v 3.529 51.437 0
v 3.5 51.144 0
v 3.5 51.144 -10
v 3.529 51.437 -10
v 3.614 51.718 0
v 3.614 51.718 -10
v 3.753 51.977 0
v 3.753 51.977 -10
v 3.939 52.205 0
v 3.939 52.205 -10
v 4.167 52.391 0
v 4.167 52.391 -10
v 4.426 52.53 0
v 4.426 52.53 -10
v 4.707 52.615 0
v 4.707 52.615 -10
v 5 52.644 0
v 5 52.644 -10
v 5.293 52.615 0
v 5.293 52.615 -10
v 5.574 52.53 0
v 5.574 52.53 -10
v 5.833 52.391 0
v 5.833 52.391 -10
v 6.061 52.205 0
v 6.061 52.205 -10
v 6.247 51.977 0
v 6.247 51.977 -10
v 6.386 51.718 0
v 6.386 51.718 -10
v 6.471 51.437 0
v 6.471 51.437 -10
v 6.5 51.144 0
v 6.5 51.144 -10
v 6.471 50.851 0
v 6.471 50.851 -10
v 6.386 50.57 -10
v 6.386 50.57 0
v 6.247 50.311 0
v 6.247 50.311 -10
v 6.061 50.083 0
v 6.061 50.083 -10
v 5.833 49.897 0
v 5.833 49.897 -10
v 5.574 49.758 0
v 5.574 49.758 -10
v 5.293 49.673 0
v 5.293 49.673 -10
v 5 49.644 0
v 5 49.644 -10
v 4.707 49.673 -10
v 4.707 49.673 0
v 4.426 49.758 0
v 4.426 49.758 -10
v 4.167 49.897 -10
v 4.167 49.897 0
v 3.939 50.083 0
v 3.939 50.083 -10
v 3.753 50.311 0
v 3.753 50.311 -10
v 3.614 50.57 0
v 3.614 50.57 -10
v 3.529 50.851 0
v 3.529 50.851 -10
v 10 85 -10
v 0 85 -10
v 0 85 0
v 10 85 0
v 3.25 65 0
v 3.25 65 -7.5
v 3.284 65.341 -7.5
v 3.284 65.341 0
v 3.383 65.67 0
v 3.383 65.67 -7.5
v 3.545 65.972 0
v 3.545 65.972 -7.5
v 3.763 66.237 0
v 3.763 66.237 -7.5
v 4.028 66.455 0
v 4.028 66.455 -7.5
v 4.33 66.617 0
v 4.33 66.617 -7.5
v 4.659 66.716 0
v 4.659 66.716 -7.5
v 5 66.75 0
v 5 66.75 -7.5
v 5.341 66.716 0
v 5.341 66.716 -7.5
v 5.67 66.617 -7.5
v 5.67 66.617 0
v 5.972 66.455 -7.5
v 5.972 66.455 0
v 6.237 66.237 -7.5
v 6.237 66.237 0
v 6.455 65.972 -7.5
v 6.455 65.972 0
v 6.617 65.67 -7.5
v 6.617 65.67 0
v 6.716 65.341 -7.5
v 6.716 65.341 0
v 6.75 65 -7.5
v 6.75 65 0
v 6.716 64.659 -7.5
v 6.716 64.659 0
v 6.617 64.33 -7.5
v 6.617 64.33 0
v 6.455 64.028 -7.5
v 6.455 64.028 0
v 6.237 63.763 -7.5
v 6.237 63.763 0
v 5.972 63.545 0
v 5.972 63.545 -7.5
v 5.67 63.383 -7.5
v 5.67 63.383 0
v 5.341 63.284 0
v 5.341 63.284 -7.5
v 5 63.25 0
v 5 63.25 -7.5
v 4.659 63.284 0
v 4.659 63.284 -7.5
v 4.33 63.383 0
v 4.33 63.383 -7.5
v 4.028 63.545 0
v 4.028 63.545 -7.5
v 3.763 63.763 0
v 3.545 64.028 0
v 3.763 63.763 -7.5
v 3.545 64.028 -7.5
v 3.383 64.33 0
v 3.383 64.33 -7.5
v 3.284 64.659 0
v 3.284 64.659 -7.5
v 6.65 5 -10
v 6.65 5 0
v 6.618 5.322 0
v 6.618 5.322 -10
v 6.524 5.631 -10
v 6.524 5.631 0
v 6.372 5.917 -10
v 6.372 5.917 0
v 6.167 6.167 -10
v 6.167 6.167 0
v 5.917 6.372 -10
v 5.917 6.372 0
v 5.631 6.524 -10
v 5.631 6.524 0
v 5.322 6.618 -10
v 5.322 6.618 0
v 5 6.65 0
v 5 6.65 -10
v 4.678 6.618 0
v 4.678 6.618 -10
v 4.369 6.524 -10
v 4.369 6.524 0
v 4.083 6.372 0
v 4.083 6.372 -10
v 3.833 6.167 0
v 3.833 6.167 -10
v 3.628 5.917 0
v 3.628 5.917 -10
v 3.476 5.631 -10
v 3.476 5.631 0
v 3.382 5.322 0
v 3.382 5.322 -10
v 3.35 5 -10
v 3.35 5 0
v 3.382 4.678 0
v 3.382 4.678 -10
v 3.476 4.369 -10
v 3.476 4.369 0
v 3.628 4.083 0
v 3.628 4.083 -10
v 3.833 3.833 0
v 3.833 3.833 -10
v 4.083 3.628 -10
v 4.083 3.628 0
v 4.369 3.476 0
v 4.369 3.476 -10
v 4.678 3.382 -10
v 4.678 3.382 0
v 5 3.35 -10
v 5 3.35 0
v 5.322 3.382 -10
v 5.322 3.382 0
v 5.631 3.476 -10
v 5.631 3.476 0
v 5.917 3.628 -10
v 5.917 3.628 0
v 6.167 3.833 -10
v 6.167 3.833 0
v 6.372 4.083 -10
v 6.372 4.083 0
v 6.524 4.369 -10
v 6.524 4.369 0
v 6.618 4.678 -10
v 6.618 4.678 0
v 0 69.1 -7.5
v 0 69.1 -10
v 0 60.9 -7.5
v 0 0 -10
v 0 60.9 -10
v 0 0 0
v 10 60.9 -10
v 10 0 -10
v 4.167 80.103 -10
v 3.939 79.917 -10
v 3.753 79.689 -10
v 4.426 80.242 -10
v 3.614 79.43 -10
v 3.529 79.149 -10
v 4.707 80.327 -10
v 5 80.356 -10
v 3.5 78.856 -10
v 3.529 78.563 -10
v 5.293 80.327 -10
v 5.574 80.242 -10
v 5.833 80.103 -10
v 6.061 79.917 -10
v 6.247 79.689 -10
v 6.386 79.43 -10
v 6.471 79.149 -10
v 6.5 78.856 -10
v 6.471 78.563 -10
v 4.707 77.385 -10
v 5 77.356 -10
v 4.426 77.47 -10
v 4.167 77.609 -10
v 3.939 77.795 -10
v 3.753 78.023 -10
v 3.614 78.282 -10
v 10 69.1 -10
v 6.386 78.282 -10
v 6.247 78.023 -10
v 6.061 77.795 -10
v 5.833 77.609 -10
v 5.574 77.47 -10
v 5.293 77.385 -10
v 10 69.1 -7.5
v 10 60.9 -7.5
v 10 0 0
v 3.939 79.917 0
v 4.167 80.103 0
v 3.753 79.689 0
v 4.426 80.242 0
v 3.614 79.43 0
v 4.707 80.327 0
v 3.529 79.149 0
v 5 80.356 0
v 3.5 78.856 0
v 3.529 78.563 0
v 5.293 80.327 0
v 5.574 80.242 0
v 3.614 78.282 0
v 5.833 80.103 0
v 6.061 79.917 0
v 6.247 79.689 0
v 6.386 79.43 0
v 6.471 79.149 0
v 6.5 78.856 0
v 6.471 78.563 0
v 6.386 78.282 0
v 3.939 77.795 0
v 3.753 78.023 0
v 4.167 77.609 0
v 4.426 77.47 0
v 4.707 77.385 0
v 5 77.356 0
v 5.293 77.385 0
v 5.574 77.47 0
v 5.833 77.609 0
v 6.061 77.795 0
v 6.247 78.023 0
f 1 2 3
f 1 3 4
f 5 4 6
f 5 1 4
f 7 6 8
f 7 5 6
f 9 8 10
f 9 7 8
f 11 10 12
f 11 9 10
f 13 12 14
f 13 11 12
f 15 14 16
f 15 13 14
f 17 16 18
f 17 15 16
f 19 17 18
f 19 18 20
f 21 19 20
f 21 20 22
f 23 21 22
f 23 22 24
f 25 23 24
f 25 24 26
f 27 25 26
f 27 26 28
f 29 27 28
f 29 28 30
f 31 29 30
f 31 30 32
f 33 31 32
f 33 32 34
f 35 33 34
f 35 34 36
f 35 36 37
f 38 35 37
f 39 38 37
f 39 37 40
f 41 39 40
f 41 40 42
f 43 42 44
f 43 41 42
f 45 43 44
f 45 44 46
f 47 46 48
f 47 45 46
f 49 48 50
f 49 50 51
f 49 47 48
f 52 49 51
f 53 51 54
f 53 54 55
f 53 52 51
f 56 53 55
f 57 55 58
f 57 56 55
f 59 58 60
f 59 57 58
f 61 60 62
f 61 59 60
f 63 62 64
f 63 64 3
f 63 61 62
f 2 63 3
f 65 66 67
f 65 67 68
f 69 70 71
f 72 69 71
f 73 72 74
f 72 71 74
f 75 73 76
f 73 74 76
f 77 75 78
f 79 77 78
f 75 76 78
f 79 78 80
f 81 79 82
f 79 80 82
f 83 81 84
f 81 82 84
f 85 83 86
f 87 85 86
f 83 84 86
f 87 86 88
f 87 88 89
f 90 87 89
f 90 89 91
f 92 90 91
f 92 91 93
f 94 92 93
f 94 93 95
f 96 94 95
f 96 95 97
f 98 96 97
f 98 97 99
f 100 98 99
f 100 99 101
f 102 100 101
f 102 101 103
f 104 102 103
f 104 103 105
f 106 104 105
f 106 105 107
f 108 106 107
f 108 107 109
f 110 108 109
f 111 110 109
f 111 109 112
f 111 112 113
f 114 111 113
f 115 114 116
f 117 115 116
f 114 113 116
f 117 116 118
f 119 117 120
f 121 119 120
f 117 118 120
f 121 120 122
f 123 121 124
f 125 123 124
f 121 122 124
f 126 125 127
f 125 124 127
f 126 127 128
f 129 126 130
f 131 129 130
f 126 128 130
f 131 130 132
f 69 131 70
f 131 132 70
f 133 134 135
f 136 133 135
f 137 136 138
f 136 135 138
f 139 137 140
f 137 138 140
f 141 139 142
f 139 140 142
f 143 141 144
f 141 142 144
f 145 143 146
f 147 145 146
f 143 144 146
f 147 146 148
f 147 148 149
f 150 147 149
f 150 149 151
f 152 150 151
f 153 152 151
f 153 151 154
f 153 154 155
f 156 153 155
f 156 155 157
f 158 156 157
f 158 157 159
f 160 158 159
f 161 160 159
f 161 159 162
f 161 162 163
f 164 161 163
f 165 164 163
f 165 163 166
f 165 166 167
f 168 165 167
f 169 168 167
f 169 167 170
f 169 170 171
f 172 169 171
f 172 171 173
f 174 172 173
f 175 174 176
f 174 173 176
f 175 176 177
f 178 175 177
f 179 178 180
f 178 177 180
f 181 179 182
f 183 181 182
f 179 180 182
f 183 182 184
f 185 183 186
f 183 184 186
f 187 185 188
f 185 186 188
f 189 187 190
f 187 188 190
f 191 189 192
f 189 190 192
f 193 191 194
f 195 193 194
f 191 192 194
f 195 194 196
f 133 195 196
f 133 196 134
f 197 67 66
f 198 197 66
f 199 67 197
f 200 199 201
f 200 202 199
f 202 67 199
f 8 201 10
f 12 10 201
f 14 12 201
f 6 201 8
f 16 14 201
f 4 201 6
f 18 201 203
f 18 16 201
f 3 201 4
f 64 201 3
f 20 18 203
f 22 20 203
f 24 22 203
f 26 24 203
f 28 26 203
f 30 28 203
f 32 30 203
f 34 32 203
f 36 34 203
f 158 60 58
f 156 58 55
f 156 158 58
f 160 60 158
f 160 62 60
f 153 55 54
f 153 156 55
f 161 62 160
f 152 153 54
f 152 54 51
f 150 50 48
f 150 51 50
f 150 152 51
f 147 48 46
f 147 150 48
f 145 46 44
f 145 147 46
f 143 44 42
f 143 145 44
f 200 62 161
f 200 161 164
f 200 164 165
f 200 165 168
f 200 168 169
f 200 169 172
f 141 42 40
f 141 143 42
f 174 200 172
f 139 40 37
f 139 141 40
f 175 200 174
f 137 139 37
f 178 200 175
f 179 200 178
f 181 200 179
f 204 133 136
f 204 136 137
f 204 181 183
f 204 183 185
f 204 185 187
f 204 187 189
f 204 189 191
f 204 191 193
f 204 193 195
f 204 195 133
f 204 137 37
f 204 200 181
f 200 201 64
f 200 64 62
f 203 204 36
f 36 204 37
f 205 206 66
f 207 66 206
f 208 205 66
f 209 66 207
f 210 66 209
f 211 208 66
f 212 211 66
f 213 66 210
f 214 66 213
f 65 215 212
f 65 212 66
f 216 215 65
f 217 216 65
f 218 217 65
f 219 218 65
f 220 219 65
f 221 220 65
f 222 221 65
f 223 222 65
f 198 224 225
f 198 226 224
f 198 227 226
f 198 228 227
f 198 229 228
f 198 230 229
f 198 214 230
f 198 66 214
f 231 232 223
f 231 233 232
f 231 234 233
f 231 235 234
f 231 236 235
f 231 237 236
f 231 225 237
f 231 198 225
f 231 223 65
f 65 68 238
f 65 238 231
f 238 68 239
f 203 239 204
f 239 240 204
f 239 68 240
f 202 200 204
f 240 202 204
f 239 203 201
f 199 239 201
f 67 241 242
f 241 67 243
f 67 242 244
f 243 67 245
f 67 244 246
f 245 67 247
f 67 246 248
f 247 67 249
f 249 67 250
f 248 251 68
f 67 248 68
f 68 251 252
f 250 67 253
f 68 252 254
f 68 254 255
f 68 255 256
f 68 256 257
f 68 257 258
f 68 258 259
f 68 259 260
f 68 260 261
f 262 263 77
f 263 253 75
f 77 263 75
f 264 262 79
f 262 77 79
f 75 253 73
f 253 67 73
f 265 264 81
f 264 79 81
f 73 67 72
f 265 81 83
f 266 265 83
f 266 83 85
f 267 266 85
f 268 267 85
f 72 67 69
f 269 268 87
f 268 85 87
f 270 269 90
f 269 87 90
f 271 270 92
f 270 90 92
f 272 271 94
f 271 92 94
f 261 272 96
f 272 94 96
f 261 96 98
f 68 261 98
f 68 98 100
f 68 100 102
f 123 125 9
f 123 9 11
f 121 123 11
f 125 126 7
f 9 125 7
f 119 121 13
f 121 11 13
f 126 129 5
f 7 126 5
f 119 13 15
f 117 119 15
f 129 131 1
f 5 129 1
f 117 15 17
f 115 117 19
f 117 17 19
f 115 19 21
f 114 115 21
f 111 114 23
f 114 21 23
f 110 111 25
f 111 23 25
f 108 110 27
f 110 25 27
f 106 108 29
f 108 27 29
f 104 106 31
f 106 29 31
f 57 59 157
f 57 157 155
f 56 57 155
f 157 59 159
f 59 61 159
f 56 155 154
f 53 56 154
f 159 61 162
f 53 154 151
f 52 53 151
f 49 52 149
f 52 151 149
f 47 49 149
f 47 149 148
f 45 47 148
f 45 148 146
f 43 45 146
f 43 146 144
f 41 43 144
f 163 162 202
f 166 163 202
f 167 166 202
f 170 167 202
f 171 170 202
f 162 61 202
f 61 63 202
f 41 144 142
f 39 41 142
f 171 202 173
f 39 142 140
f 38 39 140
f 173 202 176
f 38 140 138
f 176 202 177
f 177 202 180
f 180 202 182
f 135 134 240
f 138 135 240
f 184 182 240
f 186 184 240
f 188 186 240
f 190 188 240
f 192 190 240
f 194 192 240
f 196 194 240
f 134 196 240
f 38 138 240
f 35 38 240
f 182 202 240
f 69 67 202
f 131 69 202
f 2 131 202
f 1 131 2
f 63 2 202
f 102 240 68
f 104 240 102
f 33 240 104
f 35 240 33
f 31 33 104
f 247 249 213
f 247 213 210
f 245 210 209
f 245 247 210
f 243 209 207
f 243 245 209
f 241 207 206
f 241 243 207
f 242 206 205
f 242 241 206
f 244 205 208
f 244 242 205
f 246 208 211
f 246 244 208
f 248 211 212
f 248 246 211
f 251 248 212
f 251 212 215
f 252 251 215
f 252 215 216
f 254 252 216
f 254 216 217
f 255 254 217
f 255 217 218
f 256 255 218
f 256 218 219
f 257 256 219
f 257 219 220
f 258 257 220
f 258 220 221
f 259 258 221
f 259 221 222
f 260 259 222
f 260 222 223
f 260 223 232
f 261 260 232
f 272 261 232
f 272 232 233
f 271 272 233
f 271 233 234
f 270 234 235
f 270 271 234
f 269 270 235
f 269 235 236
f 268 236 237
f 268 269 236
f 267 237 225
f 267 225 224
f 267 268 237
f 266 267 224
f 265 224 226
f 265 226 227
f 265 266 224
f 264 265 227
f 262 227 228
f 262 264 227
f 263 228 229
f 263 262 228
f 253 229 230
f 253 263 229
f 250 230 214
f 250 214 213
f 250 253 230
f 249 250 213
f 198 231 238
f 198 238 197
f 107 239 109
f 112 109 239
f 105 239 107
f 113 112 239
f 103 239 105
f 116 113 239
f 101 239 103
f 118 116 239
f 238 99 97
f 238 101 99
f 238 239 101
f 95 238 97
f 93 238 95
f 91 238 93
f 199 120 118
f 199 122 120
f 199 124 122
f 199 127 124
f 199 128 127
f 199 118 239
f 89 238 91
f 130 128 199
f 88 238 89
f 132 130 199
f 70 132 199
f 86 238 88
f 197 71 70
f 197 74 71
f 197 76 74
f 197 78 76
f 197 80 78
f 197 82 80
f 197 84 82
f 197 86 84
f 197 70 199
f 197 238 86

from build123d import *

# Parameters (mm, degrees)
SKETCH1_W               = 10
SKETCH1_H               = 10
BOSS_EXTRUDE1_DEPTH     = 85
CUT_EXTRUDE1_DEPTH      = 2.5
SKETCH3_R               = 1.75
CUT_EXTRUDE2_DEPTH      = 86.914201387
CUT_EXTRUDE3_DEPTH      = 2.5
CUT_EXTRUDE3_DEPTH_BACK = 86.914201387
SKETCH4_R               = 1.5
SKETCH5_R               = 1.65
CUT_EXTRUDE4_DEPTH      = 87.168439698


with BuildPart() as part:
    # Sketch1 → Boss-Extrude1 (new body)
    with BuildSketch(Plane(origin=(0, 0, 0), x_dir=(1, 0, 0), z_dir=(0, 1, 0))):
        with Locations((5, 5)):
            Rectangle(SKETCH1_W, SKETCH1_H)
    extrude(amount=BOSS_EXTRUDE1_DEPTH)

    # Sketch2 → Cut-Extrude1 (cut)
    with BuildSketch(Plane(origin=(0, 0, -10), x_dir=(-1, 0, 0), z_dir=(0, 0, -1))):
        Polygon((0, 60.9), (0, 69.1), (-5, 69.1), (-10, 69.1), (-10, 60.9), align=None)
    extrude(amount=-CUT_EXTRUDE1_DEPTH, mode=Mode.SUBTRACT)

    # Sketch3 → Cut-Extrude2 (cut, through all)
    with BuildSketch(Plane(origin=(0, 0, -7.5), x_dir=(-1, 0, 0), z_dir=(0, 0, -1))):
        with Locations((-5, 65)):
            Circle(SKETCH3_R)
    extrude(amount=-CUT_EXTRUDE2_DEPTH, mode=Mode.SUBTRACT)

    # Sketch4 → Cut-Extrude3 (cut, two sides: drawn at the far end of the back side and taken through both)
    with BuildSketch(Plane(origin=(0, 0, -7.5), x_dir=(-1, 0, 0), z_dir=(0, 0, -1)).offset(-CUT_EXTRUDE3_DEPTH_BACK)):
        with Locations((-5, 78.856)):
            Circle(SKETCH4_R)
        with Locations((-5, 51.144)):
            Circle(SKETCH4_R)
    extrude(amount=CUT_EXTRUDE3_DEPTH + CUT_EXTRUDE3_DEPTH_BACK, mode=Mode.SUBTRACT)

    # Sketch5 → Cut-Extrude4 (cut, through all)
    with BuildSketch(Plane.XY):
        with Locations((5, 5)):
            Circle(SKETCH5_R)
    extrude(amount=-CUT_EXTRUDE4_DEPTH, mode=Mode.SUBTRACT)


solid = part.part
